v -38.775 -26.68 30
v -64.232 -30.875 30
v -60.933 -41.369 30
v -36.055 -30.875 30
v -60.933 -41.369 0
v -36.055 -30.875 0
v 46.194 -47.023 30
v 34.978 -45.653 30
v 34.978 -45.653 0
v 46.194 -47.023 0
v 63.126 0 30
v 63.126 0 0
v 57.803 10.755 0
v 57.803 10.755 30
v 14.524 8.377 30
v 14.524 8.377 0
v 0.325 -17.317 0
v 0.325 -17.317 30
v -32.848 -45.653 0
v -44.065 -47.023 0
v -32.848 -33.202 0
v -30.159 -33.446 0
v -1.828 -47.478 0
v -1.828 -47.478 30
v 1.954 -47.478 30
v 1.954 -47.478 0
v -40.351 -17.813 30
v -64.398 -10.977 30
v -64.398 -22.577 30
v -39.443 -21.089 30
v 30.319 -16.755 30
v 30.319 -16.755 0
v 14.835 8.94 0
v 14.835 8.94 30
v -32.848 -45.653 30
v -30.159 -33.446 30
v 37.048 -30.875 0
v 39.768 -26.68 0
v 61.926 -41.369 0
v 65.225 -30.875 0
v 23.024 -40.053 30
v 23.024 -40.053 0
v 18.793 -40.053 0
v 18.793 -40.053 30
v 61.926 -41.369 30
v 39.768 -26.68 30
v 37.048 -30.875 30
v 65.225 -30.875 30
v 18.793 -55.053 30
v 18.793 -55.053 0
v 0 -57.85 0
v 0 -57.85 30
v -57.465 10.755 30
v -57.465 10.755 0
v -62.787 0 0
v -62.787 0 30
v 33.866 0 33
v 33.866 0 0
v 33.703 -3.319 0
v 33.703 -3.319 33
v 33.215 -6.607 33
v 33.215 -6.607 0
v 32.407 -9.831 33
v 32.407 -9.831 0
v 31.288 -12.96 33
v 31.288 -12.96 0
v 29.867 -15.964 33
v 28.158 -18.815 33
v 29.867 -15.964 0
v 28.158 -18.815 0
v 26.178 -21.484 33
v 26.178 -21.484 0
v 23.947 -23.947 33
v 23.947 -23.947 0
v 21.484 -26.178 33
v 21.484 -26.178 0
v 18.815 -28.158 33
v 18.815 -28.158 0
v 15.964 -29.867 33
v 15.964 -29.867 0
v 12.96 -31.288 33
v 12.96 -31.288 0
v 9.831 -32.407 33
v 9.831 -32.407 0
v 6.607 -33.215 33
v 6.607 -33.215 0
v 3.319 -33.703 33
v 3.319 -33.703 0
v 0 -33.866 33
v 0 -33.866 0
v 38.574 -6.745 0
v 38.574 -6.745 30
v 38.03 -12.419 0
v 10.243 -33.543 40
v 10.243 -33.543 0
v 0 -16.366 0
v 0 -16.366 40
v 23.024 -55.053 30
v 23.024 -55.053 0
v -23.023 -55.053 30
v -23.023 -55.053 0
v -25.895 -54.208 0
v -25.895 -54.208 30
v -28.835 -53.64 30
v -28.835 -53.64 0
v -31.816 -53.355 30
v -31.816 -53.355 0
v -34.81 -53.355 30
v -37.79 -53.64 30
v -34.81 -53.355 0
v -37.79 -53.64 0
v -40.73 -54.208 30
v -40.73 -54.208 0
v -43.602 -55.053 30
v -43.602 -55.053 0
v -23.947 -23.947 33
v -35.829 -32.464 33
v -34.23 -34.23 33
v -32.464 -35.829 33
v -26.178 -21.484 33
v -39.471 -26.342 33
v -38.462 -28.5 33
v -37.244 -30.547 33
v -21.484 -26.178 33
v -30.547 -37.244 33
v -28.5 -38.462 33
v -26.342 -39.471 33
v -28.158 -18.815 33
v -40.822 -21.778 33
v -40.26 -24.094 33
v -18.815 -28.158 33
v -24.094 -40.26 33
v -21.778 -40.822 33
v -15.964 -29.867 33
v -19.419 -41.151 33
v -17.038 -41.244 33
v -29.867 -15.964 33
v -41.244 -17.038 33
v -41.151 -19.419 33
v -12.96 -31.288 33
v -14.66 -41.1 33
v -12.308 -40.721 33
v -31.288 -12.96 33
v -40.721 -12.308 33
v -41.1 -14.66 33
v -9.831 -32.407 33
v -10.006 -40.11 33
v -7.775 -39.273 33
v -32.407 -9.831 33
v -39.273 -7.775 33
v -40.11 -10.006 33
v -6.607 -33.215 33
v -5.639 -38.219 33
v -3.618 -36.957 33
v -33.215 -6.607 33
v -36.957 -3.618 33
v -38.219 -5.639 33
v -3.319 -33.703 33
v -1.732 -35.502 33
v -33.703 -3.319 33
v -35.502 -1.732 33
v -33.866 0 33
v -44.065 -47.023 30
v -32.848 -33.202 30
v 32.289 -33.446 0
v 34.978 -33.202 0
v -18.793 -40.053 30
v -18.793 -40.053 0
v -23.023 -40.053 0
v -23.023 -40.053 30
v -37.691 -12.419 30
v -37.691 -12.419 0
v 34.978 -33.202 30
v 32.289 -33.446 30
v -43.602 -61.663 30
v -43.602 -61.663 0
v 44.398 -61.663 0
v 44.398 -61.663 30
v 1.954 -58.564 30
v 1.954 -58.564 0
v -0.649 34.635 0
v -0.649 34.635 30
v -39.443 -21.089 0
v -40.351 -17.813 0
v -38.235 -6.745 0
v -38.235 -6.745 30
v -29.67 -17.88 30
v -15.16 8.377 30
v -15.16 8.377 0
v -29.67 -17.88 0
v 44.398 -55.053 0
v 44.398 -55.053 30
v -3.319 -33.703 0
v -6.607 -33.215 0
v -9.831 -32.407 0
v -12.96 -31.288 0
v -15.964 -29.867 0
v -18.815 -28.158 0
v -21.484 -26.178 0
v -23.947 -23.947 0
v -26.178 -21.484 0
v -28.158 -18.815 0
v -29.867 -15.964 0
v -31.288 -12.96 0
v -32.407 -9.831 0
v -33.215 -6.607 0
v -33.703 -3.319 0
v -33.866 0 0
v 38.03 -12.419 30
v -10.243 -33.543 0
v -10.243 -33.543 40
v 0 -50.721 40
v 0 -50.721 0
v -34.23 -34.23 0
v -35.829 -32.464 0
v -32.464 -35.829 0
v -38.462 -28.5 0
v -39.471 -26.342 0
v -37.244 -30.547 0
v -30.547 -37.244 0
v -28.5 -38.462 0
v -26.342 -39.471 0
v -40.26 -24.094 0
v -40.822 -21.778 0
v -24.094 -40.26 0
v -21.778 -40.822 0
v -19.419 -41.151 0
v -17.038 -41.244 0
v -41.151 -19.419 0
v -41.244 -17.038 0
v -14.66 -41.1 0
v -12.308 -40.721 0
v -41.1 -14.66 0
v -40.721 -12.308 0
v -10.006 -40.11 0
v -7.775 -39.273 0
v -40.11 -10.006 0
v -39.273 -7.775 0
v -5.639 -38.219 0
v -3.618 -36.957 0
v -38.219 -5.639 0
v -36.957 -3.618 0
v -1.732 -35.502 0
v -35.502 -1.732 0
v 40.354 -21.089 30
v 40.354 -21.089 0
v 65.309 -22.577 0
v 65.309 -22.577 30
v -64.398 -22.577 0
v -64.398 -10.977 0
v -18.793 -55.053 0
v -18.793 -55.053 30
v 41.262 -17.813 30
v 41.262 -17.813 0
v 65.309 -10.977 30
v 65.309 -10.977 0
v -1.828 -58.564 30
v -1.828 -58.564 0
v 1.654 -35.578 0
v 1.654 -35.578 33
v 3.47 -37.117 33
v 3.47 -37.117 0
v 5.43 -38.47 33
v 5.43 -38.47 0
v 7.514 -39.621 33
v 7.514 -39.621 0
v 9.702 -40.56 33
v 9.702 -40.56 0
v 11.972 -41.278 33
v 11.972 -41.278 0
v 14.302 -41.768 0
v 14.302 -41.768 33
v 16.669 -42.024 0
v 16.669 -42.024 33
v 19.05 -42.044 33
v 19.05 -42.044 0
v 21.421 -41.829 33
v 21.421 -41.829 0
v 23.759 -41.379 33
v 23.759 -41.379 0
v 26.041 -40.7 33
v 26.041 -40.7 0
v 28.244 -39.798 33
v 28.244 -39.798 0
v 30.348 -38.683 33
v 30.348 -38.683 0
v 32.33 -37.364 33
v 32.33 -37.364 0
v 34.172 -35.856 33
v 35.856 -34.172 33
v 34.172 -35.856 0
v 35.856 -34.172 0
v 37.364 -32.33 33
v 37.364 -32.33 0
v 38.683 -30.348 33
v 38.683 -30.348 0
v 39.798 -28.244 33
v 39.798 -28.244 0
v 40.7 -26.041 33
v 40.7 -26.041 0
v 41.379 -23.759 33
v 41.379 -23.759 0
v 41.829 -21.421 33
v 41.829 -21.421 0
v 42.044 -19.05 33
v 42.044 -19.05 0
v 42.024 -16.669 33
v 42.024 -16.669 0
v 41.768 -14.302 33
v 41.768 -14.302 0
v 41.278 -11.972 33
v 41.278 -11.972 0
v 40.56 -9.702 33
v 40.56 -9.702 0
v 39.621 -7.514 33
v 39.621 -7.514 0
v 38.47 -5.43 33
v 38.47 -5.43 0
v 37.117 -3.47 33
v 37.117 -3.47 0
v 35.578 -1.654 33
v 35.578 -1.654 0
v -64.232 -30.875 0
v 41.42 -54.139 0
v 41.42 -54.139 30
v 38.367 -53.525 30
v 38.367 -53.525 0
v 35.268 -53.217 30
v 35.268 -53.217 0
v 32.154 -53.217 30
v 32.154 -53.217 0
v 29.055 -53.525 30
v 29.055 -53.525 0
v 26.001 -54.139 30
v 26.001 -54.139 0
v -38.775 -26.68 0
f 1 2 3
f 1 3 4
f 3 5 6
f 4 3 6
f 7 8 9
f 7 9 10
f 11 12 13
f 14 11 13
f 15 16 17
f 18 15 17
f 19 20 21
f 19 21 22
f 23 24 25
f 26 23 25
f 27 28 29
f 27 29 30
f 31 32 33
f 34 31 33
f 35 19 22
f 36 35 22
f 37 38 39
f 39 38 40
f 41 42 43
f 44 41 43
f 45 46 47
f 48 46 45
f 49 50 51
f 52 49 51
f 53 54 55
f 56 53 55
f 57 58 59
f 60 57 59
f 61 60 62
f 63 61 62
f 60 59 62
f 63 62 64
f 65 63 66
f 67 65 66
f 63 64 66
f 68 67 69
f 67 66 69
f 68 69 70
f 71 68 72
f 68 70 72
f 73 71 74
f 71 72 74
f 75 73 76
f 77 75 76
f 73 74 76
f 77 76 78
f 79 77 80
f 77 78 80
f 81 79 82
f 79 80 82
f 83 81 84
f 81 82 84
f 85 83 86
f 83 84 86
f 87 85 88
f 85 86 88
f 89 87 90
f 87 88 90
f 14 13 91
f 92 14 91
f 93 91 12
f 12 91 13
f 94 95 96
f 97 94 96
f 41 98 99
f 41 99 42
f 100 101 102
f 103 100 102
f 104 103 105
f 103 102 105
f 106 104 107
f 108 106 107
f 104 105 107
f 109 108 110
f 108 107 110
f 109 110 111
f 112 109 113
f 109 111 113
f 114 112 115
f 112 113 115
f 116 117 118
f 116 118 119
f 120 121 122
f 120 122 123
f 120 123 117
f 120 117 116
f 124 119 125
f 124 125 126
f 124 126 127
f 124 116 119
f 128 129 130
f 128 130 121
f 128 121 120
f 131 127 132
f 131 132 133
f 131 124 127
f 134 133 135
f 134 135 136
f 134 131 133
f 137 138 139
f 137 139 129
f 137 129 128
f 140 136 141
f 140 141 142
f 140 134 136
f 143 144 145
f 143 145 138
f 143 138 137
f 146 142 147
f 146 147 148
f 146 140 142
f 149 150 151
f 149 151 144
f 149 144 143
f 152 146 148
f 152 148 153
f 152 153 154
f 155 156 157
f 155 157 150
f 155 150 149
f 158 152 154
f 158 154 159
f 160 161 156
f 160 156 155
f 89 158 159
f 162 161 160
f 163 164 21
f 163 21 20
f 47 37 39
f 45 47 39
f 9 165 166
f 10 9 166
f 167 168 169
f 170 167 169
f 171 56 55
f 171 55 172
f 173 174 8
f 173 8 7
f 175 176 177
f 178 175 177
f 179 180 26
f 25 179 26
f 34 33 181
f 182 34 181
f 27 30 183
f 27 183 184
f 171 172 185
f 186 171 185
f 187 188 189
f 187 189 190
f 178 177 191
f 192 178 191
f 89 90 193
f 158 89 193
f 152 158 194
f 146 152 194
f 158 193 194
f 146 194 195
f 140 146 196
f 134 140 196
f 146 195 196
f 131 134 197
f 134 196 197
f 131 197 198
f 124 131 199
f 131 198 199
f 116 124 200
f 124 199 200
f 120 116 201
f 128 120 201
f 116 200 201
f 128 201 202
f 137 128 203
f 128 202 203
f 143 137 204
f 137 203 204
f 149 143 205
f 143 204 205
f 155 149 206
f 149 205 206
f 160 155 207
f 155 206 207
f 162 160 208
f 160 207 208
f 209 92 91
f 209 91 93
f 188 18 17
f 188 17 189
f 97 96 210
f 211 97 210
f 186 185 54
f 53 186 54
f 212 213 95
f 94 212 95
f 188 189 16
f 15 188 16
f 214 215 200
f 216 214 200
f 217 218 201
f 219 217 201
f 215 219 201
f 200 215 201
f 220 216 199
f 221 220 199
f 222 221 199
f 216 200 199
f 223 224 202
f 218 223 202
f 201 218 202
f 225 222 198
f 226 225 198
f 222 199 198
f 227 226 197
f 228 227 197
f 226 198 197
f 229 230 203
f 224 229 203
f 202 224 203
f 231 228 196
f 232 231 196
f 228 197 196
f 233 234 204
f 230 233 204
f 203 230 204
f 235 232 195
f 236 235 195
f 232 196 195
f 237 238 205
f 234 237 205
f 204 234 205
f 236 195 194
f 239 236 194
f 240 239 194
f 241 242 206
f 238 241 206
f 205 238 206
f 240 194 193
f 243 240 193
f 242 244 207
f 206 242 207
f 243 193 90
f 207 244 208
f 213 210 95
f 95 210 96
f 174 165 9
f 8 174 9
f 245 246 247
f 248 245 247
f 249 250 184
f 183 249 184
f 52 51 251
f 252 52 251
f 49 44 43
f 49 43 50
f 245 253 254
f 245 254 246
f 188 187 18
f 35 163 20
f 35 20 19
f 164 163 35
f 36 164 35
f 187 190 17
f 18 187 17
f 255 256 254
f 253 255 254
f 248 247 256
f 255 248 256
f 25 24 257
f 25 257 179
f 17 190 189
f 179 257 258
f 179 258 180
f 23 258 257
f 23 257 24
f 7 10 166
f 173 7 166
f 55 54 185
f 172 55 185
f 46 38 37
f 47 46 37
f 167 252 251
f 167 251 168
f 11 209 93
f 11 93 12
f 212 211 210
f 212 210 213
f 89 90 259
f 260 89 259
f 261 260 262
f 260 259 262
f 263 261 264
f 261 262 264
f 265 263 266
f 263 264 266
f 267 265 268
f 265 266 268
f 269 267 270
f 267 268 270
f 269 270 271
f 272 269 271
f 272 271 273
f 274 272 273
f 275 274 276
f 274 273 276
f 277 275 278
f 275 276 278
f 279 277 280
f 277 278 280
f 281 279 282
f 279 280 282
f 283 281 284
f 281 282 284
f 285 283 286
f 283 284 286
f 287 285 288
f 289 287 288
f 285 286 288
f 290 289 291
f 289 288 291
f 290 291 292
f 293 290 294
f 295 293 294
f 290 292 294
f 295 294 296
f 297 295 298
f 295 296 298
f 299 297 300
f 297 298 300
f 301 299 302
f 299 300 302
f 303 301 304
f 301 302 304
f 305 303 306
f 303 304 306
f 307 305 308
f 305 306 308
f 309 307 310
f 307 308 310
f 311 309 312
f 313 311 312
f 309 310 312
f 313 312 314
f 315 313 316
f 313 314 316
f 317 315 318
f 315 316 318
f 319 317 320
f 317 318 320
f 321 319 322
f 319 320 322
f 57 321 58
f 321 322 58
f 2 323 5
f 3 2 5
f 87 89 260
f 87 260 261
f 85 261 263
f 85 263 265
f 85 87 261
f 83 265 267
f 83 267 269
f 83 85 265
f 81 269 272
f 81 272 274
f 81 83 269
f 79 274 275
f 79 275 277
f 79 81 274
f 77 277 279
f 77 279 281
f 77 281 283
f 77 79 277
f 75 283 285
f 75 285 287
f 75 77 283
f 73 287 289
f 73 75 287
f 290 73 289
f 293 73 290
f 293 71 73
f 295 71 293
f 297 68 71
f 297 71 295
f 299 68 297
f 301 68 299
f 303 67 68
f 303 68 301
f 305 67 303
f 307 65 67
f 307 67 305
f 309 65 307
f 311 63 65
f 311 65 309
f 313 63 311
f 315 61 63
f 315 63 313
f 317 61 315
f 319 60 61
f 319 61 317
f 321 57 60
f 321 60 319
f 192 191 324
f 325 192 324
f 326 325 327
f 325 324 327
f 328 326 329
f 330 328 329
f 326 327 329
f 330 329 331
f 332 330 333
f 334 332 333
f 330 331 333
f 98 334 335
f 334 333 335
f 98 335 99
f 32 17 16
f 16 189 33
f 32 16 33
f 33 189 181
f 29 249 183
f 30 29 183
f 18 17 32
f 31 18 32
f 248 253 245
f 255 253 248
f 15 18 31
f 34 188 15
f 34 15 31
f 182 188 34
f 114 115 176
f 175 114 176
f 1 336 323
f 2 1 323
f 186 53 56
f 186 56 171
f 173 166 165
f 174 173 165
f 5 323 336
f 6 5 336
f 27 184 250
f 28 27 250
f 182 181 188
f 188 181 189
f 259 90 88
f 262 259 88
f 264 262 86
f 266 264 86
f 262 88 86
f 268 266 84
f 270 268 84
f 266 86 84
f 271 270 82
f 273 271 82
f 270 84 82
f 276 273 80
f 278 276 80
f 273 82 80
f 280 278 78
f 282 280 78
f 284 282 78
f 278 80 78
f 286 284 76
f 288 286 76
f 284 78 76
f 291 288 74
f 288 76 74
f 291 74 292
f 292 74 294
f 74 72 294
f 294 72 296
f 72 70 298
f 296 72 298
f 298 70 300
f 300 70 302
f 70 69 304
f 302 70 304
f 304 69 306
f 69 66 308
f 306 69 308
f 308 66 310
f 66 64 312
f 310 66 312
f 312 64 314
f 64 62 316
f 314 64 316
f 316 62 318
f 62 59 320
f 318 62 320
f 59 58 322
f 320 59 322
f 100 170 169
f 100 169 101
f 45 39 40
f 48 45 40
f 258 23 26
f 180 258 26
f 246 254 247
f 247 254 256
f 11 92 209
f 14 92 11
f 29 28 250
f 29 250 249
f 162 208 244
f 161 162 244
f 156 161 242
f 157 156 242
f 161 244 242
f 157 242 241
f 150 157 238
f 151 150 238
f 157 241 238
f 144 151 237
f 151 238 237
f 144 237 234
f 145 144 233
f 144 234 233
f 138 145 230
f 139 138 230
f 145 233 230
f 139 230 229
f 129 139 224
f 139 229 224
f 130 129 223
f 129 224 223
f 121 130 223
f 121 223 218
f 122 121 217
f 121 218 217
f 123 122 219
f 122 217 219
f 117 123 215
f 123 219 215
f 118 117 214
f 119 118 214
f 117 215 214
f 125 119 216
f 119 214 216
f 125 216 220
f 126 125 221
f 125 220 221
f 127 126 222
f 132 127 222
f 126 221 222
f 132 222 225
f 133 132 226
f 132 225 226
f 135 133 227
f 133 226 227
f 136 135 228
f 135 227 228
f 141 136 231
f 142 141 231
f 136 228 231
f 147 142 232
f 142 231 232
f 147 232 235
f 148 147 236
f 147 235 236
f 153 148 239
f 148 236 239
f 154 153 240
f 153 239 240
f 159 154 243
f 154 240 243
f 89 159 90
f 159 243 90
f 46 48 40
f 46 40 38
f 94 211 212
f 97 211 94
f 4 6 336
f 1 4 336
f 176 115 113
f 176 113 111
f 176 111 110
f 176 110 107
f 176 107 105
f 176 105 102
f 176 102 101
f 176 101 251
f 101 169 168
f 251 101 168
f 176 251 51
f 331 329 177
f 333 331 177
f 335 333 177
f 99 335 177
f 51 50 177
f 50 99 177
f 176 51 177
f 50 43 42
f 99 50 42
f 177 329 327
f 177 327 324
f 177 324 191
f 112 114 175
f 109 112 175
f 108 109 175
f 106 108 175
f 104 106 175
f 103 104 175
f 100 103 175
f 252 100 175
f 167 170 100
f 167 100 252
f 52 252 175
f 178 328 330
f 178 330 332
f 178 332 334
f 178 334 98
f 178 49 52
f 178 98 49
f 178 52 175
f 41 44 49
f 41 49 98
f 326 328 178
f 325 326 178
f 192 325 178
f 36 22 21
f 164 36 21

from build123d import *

# Parameters (mm, degrees)
F1_DEPTH  = 30
F3_DEPTH  = 33
F5_DEPTH  = 40
F7_DEPTH  = 30
F9_DEPTH  = 30
F11_DEPTH = 30
F13_DEPTH = 30
F14_W     = 3.782077
F14_H     = 11.085399
F15_DEPTH = 30


with BuildPart() as f1:
    # F0 (on Top) → F1 (new body)
    with BuildSketch(Plane.XY):
        Polygon((14.524153, 8.377491), (14.834989, 8.939973), (-0.649498, 34.634927), (-15.159738, 8.377491), align=None)
        Polygon((-29.669977, -17.879945), (0.324749, -17.317463), (-15.159738, 8.377491), align=None)
        Polygon((0.324749, -17.317463), (30.319475, -16.754982), (14.834989, 8.939973), (14.524153, 8.377491), align=None)
    extrude(amount=F1_DEPTH)


with BuildPart() as f3:
    # F2 (on Top) → F3 (new body)
    with BuildSketch(Plane.XY):
        with BuildLine():
            ThreePointArc((33.865582, 0), (23.946583, -23.946583), (0, -33.865582))
            ThreePointArc((0, -33.865582), (35.034983, -35.034983), (33.865582, 0))
        make_face()
        with BuildLine():
            ThreePointArc((0, -33.865582), (-23.946583, -23.946583), (-33.865582, 0))
            ThreePointArc((-33.865582, 0), (-34.230033, -34.230033), (0, -33.865582))
        make_face()
    extrude(amount=F3_DEPTH)


with BuildPart() as f5:
    # F4 (on Top) → F5 (new body)
    with BuildSketch(Plane.XY):
        Polygon((10.243464, -33.543441), (0, -16.365798), (-10.243464, -33.543441), (0, -50.721085), align=None)
    extrude(amount=F5_DEPTH)


with BuildPart() as f7:
    # F6 (on Top) → F7 (new body)
    with BuildSketch(Plane.XY):
        Polygon((-37.6914, -12.418555), (-38.235461, -6.74458), (-57.46457, 10.755175), (-62.786807, 0), align=None)
        Polygon((57.803264, 10.755175), (38.574155, -6.74458), (38.030094, -12.418555), (63.125501, 0), align=None)
    extrude(amount=F7_DEPTH)


with BuildPart() as f9:
    # F8 (on Top) → F9 (new body)
    with BuildSketch(Plane.XY):
        Polygon((-36.055497, -30.875205), (-38.775463, -26.679758), (-64.232058, -30.875205), (-60.932887, -41.368797), align=None)
        Polygon((65.224838, -30.875205), (39.768244, -26.679758), (37.048277, -30.875205), (61.925667, -41.368797), align=None)
        Polygon((-39.442767, -21.089044), (-40.351194, -17.81265), (-64.39846, -10.976788), (-64.39846, -22.576788), align=None)
        Polygon((65.309278, -10.976788), (41.262012, -17.81265), (40.353585, -21.089044), (65.309278, -22.576788), align=None)
    extrude(amount=F9_DEPTH)


with BuildPart() as f11:
    # F10 (on Top) → F11 (new body)
    with BuildSketch(Plane.XY):
        Polygon((-30.159193, -33.445716), (-32.848148, -33.201745), (-44.064802, -47.022985), (-32.848148, -45.653071), align=None)
        Polygon((34.977713, -33.201745), (32.288759, -33.445716), (34.977713, -45.653071), (46.194368, -47.022985), align=None)
    extrude(amount=F11_DEPTH)


with BuildPart() as f13:
    # F12 (on Top) → F13 (new body)
    with BuildSketch(Plane.XY):
        with BuildLine():
            Line((-18.792957, -40.052891), (-23.022957, -40.052891))
            Line((-23.022957, -40.052891), (-23.022957, -55.052891))
            ThreePointArc((-23.022957, -55.052891), (-33.312693, -53.319056), (-43.60243, -55.052891))
            Line((-43.60243, -55.052891), (-43.60243, -61.662891))
            Line((-43.60243, -61.662891), (44.39757, -61.662891))
            Line((44.39757, -61.662891), (44.39757, -55.052891))
            ThreePointArc((44.39757, -55.052891), (33.710786, -53.178349), (23.024002, -55.052891))
            Line((23.024002, -55.052891), (23.024002, -40.052891))
            Line((23.024002, -40.052891), (18.792957, -40.052891))
            Line((18.792957, -40.052891), (18.792957, -55.052891))
            Line((18.792957, -55.052891), (0, -57.850171))
            Line((0, -57.850171), (-18.792957, -55.052891))
            Line((-18.792957, -55.052891), (-18.792957, -40.052891))
        make_face()
    extrude(amount=F13_DEPTH)


with BuildPart() as f15:
    # F14 (on Top) → F15 (new body)
    with BuildSketch(Plane.XY):
        with Locations((0.063032, -53.021136)):
            Rectangle(F14_W, F14_H)
    extrude(amount=F15_DEPTH)


solid = Compound([f1.part, f3.part, f5.part, f7.part, f9.part, f11.part, f13.part, f15.part])
